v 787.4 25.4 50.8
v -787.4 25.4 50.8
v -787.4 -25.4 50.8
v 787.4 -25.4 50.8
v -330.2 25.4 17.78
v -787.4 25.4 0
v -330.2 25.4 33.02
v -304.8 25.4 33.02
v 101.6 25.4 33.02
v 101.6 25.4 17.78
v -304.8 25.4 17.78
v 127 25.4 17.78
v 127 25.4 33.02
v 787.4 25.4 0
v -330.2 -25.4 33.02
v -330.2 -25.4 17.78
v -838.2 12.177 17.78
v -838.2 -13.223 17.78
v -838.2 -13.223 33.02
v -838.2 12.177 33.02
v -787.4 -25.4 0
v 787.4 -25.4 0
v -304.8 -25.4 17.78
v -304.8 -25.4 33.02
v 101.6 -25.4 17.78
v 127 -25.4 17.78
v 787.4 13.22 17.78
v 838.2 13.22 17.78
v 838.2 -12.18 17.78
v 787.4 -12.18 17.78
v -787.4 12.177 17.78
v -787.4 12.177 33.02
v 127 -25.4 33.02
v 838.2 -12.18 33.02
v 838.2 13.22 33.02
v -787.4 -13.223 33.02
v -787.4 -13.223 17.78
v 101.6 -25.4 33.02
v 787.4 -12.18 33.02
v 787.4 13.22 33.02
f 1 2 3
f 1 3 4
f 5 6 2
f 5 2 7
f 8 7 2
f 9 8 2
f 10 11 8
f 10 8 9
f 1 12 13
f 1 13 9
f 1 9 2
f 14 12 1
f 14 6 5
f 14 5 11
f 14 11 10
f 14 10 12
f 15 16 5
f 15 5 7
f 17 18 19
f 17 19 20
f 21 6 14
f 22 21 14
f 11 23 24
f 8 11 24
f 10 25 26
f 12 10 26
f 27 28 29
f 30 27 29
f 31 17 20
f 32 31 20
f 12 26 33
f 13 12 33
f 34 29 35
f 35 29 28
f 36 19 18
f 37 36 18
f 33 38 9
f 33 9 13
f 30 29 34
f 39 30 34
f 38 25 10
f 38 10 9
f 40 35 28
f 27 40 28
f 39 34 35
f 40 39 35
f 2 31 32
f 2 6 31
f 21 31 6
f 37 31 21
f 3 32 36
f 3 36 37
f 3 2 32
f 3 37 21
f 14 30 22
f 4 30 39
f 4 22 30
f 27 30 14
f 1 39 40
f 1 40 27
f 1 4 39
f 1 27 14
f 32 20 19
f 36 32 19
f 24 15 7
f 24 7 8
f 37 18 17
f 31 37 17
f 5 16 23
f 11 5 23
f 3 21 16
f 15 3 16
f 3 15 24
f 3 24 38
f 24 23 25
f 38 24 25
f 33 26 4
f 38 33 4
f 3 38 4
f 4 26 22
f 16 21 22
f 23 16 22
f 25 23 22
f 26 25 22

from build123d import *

# Parameters (mm, degrees)
F0_W     = 1676.4
F0_H     = 50.8
F1_DEPTH = 50.8
F2_W     = 50.8
F2_H     = 50.8
F3_DEPTH = 50.8
F5_DEPTH = 50.8
F6_W     = 25.4
F6_H     = 15.24
F7_DEPTH = 50.8
F8_W     = 25.4
F8_H     = 15.24
F9_DEPTH = 50.8


with BuildPart() as f1:
    # F0 (on Top) → F1 (new body)
    with BuildSketch(Plane.XY):
        Rectangle(F0_W, F0_H)
    extrude(amount=F1_DEPTH)

    # F2 (on face) → F3 (cut)
    with BuildSketch(Plane(origin=(-838.2, 0, 0), x_dir=(0, -1, 0), z_dir=(-1, 0, 0))):
        with Locations((0, 25.4)):
            Rectangle(F2_W, F2_H)
        Polygon((-12.177117, 33.02), (0, 33.02), (13.222883, 33.02), (13.222883, 17.78), (-12.177117, 17.78), align=None, mode=Mode.SUBTRACT)
    extrude(amount=-F3_DEPTH, mode=Mode.SUBTRACT)

    # F4 (on face) → F5 (cut)
    with BuildSketch(Plane.YZ.offset(838.2)):
        Polygon((25.4, 50.8), (0, 50.8), (-25.4, 50.8), (-25.4, 0), (25.4, 0), align=None)
        Polygon((-12.179509, 33.02), (0, 33.02), (13.220491, 33.02), (13.220491, 17.78), (-12.179509, 17.78), align=None, mode=Mode.SUBTRACT)
    extrude(amount=-F5_DEPTH, mode=Mode.SUBTRACT)

    # F6 (on face) → F7 (cut)
    with BuildSketch(Plane.XZ.offset(25.4)):
        with Locations((-317.5, 25.4)):
            Rectangle(F6_W, F6_H)
    extrude(amount=-F7_DEPTH, mode=Mode.SUBTRACT)

    # F8 (on face) → F9 (cut)
    with BuildSketch(Plane.XZ.offset(25.4)):
        with Locations((114.3, 25.4)):
            Rectangle(F8_W, F8_H)
    extrude(amount=-F9_DEPTH, mode=Mode.SUBTRACT)


solid = f1.part
